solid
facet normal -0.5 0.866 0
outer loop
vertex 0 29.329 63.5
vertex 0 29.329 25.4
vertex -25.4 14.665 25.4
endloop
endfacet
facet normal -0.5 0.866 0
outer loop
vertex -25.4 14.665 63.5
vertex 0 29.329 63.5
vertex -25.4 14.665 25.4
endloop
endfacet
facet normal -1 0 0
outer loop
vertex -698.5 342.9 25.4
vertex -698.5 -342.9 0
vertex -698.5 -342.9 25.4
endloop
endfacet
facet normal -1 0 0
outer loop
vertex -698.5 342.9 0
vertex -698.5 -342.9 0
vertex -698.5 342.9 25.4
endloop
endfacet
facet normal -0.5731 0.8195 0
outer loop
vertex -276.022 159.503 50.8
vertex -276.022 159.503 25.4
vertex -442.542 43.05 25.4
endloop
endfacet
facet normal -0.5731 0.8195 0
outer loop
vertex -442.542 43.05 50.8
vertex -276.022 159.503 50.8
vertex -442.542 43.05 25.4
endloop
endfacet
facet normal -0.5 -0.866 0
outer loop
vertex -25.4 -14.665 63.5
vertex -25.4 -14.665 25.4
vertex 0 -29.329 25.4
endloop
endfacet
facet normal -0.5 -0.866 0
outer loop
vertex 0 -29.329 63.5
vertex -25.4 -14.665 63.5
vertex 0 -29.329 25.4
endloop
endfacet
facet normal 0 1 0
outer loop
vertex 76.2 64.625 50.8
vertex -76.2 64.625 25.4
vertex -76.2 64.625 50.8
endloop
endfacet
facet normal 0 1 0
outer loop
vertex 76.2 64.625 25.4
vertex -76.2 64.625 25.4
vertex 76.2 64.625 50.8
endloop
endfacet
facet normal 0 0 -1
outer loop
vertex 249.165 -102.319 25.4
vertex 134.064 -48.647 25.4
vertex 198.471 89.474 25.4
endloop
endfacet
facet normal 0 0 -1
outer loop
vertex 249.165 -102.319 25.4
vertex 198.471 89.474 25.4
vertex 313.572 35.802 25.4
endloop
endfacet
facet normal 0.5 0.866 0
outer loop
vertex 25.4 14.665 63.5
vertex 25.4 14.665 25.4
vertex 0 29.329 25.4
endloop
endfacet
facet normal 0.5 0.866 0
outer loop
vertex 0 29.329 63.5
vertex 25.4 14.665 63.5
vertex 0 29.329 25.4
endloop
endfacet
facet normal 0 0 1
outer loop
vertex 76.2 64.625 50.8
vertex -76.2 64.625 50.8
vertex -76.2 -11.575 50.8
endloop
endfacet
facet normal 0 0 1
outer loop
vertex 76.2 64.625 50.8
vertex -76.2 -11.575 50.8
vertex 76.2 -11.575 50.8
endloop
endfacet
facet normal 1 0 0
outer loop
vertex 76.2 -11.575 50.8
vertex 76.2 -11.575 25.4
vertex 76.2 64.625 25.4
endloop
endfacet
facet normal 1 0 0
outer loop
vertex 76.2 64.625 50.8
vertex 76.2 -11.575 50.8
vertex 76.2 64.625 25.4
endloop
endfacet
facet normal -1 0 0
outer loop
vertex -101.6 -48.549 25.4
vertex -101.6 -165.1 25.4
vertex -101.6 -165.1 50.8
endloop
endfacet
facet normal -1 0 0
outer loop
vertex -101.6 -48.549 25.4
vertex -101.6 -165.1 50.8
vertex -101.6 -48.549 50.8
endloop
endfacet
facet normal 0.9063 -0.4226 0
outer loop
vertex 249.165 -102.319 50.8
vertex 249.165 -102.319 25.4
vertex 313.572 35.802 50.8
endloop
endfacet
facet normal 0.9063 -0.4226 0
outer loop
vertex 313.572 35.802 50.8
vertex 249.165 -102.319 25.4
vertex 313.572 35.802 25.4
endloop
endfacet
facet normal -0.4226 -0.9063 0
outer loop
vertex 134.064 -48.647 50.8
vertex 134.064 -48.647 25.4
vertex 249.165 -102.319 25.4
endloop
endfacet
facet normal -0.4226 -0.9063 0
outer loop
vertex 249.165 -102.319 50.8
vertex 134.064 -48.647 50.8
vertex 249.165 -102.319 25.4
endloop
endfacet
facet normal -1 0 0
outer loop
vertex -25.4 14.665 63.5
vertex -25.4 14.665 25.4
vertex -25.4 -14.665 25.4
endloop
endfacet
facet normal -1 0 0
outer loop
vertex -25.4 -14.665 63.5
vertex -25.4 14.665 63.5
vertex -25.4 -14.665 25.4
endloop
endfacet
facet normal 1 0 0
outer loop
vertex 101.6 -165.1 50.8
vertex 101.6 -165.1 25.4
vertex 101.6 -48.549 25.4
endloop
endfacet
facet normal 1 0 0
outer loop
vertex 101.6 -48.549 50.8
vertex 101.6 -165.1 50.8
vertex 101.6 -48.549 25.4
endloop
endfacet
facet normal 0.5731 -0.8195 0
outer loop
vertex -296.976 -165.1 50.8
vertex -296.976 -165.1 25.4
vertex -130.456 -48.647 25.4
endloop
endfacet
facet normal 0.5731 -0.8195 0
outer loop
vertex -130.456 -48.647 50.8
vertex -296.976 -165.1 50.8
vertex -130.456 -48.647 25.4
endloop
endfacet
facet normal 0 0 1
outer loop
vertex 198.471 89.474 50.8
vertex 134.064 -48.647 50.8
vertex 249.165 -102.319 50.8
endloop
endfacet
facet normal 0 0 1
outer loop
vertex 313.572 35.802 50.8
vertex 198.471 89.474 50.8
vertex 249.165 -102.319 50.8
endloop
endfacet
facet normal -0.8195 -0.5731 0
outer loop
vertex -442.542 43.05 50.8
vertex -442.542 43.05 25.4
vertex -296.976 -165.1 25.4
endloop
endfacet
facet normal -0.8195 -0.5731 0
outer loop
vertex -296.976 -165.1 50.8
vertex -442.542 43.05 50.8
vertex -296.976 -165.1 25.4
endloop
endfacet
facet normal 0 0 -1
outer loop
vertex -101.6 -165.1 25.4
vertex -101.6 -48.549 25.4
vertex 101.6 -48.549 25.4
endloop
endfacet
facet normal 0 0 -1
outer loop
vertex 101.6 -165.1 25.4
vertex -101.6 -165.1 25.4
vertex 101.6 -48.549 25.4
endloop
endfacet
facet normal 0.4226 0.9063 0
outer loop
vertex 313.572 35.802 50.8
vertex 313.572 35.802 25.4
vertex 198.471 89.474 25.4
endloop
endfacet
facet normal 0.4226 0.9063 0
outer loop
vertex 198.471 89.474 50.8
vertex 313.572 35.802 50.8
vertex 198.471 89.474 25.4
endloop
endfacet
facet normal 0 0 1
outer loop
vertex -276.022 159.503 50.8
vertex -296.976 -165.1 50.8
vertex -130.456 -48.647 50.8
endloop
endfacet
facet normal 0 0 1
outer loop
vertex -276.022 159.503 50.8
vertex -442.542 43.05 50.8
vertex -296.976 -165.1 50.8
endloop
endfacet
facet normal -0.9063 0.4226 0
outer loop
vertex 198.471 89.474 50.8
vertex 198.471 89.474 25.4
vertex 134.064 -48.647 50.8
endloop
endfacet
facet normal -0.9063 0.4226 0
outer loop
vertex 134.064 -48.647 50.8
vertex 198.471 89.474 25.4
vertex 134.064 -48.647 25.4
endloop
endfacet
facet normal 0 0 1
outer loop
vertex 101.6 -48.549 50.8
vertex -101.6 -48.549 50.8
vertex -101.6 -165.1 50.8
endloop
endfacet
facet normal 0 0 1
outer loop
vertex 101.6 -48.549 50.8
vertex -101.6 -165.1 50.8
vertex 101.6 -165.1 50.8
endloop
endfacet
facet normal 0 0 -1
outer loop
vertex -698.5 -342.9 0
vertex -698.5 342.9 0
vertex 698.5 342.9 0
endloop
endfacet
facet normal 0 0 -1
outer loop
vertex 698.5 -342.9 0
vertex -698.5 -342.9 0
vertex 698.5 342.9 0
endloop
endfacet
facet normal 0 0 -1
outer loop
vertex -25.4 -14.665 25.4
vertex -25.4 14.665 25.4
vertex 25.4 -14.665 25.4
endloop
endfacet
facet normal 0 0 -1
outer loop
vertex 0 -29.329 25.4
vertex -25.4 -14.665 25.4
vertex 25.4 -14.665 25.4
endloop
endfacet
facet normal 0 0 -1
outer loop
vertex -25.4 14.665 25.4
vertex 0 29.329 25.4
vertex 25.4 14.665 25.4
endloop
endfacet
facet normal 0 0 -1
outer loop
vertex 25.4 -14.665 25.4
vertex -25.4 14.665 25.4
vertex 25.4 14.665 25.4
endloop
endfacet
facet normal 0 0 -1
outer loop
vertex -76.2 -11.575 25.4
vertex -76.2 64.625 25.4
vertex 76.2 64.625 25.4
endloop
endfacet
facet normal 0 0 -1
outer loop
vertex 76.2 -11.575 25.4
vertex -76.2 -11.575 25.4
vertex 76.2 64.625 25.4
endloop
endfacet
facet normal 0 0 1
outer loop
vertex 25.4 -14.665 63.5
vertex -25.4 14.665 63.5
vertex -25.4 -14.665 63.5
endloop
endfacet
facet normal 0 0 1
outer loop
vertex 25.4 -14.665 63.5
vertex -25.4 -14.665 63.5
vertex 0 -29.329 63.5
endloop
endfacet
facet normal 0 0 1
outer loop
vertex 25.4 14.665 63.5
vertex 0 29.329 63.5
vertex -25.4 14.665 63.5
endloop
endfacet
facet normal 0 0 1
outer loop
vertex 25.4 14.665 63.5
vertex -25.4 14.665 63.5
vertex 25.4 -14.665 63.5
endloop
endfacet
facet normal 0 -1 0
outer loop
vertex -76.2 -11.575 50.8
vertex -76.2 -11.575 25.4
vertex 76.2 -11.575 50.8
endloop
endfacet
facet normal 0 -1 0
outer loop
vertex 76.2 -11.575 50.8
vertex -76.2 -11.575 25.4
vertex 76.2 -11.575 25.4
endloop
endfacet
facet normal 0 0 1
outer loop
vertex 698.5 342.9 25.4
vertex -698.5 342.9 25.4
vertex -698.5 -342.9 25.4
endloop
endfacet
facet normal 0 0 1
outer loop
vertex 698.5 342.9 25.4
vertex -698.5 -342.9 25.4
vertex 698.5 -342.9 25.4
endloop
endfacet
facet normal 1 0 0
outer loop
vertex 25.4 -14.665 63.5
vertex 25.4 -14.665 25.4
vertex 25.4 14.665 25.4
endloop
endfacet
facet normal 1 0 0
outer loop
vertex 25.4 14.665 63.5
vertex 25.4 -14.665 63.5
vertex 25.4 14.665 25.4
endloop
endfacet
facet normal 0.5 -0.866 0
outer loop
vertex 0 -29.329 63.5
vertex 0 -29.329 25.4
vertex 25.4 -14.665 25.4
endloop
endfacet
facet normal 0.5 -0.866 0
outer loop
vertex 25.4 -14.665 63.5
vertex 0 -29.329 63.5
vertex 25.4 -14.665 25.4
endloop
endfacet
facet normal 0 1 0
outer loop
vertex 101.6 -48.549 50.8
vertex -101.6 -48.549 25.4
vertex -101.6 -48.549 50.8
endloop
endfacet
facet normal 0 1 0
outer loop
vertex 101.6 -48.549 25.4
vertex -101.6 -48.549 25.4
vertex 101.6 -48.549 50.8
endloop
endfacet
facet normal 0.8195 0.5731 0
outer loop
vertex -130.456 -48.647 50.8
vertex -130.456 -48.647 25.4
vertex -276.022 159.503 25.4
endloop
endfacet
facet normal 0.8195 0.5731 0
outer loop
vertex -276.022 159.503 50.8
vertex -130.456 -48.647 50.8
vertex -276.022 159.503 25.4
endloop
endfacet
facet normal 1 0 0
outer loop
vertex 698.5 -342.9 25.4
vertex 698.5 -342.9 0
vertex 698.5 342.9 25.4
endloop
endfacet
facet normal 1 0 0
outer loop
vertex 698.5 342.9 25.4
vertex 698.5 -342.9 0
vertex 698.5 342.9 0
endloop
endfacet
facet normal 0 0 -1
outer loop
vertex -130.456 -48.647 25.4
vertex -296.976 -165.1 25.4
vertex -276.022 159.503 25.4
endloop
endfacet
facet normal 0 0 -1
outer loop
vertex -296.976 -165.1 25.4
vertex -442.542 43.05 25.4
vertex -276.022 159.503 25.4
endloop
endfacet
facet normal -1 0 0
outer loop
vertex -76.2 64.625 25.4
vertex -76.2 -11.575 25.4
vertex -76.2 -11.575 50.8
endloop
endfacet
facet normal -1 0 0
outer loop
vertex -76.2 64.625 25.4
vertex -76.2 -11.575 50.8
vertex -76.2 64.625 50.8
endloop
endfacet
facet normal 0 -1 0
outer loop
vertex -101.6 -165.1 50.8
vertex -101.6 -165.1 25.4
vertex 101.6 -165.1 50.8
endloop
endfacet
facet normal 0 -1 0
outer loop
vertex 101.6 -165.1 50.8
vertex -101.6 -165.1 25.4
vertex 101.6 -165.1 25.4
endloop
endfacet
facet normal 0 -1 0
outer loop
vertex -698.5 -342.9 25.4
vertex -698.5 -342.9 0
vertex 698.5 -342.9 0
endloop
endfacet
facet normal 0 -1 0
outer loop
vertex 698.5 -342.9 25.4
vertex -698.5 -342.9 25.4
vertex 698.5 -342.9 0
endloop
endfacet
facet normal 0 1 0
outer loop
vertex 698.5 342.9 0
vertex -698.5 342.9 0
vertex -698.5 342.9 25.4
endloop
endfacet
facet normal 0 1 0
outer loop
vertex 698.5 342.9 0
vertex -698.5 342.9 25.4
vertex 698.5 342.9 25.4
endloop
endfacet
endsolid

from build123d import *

# Parameters (mm, degrees)
F0_W     = 1397
F0_H     = 685.8
F1_DEPTH = 25.4
F2_W     = 203.2
F2_H     = 116.550732
F2_W_2   = 152.4
F2_H_2   = 76.2
F3_DEPTH = 25.4
F5_DEPTH = 38.1


with BuildPart() as f1:
    # F0 (on Top) → F1 (new body)
    with BuildSketch(Plane.XY):
        Rectangle(F0_W, F0_H)
    extrude(amount=F1_DEPTH)


with BuildPart() as f3:
    # F2 (on face) → F3 (new body)
    with BuildSketch(Plane.XY.offset(25.4)):
        with Locations((0, -106.824634)):
            Rectangle(F2_W, F2_H)
        Polygon((-296.975732, -165.1), (-130.455673, -48.646962), (-276.021971, 159.503111), (-442.54203, 43.050073), align=None)
        Polygon((313.572291, 35.801826), (198.471202, 89.474345), (134.064179, -48.646962), (249.165268, -102.319481), align=None)
        with Locations((0, 26.525366)):
            Rectangle(F2_W_2, F2_H_2)
    extrude(amount=F3_DEPTH)


with BuildPart() as f5:
    # F4 (on face) → F5 (new body)
    with BuildSketch(Plane.XY.offset(25.4)):
        Polygon((25.4, -14.664697), (25.4, 14.664697), (0, 29.329394), (-25.4, 14.664697), (-25.4, -14.664697), (0, -29.329394), align=None)
    extrude(amount=F5_DEPTH)


solid = Compound([f1.part, f3.part, f5.part])
